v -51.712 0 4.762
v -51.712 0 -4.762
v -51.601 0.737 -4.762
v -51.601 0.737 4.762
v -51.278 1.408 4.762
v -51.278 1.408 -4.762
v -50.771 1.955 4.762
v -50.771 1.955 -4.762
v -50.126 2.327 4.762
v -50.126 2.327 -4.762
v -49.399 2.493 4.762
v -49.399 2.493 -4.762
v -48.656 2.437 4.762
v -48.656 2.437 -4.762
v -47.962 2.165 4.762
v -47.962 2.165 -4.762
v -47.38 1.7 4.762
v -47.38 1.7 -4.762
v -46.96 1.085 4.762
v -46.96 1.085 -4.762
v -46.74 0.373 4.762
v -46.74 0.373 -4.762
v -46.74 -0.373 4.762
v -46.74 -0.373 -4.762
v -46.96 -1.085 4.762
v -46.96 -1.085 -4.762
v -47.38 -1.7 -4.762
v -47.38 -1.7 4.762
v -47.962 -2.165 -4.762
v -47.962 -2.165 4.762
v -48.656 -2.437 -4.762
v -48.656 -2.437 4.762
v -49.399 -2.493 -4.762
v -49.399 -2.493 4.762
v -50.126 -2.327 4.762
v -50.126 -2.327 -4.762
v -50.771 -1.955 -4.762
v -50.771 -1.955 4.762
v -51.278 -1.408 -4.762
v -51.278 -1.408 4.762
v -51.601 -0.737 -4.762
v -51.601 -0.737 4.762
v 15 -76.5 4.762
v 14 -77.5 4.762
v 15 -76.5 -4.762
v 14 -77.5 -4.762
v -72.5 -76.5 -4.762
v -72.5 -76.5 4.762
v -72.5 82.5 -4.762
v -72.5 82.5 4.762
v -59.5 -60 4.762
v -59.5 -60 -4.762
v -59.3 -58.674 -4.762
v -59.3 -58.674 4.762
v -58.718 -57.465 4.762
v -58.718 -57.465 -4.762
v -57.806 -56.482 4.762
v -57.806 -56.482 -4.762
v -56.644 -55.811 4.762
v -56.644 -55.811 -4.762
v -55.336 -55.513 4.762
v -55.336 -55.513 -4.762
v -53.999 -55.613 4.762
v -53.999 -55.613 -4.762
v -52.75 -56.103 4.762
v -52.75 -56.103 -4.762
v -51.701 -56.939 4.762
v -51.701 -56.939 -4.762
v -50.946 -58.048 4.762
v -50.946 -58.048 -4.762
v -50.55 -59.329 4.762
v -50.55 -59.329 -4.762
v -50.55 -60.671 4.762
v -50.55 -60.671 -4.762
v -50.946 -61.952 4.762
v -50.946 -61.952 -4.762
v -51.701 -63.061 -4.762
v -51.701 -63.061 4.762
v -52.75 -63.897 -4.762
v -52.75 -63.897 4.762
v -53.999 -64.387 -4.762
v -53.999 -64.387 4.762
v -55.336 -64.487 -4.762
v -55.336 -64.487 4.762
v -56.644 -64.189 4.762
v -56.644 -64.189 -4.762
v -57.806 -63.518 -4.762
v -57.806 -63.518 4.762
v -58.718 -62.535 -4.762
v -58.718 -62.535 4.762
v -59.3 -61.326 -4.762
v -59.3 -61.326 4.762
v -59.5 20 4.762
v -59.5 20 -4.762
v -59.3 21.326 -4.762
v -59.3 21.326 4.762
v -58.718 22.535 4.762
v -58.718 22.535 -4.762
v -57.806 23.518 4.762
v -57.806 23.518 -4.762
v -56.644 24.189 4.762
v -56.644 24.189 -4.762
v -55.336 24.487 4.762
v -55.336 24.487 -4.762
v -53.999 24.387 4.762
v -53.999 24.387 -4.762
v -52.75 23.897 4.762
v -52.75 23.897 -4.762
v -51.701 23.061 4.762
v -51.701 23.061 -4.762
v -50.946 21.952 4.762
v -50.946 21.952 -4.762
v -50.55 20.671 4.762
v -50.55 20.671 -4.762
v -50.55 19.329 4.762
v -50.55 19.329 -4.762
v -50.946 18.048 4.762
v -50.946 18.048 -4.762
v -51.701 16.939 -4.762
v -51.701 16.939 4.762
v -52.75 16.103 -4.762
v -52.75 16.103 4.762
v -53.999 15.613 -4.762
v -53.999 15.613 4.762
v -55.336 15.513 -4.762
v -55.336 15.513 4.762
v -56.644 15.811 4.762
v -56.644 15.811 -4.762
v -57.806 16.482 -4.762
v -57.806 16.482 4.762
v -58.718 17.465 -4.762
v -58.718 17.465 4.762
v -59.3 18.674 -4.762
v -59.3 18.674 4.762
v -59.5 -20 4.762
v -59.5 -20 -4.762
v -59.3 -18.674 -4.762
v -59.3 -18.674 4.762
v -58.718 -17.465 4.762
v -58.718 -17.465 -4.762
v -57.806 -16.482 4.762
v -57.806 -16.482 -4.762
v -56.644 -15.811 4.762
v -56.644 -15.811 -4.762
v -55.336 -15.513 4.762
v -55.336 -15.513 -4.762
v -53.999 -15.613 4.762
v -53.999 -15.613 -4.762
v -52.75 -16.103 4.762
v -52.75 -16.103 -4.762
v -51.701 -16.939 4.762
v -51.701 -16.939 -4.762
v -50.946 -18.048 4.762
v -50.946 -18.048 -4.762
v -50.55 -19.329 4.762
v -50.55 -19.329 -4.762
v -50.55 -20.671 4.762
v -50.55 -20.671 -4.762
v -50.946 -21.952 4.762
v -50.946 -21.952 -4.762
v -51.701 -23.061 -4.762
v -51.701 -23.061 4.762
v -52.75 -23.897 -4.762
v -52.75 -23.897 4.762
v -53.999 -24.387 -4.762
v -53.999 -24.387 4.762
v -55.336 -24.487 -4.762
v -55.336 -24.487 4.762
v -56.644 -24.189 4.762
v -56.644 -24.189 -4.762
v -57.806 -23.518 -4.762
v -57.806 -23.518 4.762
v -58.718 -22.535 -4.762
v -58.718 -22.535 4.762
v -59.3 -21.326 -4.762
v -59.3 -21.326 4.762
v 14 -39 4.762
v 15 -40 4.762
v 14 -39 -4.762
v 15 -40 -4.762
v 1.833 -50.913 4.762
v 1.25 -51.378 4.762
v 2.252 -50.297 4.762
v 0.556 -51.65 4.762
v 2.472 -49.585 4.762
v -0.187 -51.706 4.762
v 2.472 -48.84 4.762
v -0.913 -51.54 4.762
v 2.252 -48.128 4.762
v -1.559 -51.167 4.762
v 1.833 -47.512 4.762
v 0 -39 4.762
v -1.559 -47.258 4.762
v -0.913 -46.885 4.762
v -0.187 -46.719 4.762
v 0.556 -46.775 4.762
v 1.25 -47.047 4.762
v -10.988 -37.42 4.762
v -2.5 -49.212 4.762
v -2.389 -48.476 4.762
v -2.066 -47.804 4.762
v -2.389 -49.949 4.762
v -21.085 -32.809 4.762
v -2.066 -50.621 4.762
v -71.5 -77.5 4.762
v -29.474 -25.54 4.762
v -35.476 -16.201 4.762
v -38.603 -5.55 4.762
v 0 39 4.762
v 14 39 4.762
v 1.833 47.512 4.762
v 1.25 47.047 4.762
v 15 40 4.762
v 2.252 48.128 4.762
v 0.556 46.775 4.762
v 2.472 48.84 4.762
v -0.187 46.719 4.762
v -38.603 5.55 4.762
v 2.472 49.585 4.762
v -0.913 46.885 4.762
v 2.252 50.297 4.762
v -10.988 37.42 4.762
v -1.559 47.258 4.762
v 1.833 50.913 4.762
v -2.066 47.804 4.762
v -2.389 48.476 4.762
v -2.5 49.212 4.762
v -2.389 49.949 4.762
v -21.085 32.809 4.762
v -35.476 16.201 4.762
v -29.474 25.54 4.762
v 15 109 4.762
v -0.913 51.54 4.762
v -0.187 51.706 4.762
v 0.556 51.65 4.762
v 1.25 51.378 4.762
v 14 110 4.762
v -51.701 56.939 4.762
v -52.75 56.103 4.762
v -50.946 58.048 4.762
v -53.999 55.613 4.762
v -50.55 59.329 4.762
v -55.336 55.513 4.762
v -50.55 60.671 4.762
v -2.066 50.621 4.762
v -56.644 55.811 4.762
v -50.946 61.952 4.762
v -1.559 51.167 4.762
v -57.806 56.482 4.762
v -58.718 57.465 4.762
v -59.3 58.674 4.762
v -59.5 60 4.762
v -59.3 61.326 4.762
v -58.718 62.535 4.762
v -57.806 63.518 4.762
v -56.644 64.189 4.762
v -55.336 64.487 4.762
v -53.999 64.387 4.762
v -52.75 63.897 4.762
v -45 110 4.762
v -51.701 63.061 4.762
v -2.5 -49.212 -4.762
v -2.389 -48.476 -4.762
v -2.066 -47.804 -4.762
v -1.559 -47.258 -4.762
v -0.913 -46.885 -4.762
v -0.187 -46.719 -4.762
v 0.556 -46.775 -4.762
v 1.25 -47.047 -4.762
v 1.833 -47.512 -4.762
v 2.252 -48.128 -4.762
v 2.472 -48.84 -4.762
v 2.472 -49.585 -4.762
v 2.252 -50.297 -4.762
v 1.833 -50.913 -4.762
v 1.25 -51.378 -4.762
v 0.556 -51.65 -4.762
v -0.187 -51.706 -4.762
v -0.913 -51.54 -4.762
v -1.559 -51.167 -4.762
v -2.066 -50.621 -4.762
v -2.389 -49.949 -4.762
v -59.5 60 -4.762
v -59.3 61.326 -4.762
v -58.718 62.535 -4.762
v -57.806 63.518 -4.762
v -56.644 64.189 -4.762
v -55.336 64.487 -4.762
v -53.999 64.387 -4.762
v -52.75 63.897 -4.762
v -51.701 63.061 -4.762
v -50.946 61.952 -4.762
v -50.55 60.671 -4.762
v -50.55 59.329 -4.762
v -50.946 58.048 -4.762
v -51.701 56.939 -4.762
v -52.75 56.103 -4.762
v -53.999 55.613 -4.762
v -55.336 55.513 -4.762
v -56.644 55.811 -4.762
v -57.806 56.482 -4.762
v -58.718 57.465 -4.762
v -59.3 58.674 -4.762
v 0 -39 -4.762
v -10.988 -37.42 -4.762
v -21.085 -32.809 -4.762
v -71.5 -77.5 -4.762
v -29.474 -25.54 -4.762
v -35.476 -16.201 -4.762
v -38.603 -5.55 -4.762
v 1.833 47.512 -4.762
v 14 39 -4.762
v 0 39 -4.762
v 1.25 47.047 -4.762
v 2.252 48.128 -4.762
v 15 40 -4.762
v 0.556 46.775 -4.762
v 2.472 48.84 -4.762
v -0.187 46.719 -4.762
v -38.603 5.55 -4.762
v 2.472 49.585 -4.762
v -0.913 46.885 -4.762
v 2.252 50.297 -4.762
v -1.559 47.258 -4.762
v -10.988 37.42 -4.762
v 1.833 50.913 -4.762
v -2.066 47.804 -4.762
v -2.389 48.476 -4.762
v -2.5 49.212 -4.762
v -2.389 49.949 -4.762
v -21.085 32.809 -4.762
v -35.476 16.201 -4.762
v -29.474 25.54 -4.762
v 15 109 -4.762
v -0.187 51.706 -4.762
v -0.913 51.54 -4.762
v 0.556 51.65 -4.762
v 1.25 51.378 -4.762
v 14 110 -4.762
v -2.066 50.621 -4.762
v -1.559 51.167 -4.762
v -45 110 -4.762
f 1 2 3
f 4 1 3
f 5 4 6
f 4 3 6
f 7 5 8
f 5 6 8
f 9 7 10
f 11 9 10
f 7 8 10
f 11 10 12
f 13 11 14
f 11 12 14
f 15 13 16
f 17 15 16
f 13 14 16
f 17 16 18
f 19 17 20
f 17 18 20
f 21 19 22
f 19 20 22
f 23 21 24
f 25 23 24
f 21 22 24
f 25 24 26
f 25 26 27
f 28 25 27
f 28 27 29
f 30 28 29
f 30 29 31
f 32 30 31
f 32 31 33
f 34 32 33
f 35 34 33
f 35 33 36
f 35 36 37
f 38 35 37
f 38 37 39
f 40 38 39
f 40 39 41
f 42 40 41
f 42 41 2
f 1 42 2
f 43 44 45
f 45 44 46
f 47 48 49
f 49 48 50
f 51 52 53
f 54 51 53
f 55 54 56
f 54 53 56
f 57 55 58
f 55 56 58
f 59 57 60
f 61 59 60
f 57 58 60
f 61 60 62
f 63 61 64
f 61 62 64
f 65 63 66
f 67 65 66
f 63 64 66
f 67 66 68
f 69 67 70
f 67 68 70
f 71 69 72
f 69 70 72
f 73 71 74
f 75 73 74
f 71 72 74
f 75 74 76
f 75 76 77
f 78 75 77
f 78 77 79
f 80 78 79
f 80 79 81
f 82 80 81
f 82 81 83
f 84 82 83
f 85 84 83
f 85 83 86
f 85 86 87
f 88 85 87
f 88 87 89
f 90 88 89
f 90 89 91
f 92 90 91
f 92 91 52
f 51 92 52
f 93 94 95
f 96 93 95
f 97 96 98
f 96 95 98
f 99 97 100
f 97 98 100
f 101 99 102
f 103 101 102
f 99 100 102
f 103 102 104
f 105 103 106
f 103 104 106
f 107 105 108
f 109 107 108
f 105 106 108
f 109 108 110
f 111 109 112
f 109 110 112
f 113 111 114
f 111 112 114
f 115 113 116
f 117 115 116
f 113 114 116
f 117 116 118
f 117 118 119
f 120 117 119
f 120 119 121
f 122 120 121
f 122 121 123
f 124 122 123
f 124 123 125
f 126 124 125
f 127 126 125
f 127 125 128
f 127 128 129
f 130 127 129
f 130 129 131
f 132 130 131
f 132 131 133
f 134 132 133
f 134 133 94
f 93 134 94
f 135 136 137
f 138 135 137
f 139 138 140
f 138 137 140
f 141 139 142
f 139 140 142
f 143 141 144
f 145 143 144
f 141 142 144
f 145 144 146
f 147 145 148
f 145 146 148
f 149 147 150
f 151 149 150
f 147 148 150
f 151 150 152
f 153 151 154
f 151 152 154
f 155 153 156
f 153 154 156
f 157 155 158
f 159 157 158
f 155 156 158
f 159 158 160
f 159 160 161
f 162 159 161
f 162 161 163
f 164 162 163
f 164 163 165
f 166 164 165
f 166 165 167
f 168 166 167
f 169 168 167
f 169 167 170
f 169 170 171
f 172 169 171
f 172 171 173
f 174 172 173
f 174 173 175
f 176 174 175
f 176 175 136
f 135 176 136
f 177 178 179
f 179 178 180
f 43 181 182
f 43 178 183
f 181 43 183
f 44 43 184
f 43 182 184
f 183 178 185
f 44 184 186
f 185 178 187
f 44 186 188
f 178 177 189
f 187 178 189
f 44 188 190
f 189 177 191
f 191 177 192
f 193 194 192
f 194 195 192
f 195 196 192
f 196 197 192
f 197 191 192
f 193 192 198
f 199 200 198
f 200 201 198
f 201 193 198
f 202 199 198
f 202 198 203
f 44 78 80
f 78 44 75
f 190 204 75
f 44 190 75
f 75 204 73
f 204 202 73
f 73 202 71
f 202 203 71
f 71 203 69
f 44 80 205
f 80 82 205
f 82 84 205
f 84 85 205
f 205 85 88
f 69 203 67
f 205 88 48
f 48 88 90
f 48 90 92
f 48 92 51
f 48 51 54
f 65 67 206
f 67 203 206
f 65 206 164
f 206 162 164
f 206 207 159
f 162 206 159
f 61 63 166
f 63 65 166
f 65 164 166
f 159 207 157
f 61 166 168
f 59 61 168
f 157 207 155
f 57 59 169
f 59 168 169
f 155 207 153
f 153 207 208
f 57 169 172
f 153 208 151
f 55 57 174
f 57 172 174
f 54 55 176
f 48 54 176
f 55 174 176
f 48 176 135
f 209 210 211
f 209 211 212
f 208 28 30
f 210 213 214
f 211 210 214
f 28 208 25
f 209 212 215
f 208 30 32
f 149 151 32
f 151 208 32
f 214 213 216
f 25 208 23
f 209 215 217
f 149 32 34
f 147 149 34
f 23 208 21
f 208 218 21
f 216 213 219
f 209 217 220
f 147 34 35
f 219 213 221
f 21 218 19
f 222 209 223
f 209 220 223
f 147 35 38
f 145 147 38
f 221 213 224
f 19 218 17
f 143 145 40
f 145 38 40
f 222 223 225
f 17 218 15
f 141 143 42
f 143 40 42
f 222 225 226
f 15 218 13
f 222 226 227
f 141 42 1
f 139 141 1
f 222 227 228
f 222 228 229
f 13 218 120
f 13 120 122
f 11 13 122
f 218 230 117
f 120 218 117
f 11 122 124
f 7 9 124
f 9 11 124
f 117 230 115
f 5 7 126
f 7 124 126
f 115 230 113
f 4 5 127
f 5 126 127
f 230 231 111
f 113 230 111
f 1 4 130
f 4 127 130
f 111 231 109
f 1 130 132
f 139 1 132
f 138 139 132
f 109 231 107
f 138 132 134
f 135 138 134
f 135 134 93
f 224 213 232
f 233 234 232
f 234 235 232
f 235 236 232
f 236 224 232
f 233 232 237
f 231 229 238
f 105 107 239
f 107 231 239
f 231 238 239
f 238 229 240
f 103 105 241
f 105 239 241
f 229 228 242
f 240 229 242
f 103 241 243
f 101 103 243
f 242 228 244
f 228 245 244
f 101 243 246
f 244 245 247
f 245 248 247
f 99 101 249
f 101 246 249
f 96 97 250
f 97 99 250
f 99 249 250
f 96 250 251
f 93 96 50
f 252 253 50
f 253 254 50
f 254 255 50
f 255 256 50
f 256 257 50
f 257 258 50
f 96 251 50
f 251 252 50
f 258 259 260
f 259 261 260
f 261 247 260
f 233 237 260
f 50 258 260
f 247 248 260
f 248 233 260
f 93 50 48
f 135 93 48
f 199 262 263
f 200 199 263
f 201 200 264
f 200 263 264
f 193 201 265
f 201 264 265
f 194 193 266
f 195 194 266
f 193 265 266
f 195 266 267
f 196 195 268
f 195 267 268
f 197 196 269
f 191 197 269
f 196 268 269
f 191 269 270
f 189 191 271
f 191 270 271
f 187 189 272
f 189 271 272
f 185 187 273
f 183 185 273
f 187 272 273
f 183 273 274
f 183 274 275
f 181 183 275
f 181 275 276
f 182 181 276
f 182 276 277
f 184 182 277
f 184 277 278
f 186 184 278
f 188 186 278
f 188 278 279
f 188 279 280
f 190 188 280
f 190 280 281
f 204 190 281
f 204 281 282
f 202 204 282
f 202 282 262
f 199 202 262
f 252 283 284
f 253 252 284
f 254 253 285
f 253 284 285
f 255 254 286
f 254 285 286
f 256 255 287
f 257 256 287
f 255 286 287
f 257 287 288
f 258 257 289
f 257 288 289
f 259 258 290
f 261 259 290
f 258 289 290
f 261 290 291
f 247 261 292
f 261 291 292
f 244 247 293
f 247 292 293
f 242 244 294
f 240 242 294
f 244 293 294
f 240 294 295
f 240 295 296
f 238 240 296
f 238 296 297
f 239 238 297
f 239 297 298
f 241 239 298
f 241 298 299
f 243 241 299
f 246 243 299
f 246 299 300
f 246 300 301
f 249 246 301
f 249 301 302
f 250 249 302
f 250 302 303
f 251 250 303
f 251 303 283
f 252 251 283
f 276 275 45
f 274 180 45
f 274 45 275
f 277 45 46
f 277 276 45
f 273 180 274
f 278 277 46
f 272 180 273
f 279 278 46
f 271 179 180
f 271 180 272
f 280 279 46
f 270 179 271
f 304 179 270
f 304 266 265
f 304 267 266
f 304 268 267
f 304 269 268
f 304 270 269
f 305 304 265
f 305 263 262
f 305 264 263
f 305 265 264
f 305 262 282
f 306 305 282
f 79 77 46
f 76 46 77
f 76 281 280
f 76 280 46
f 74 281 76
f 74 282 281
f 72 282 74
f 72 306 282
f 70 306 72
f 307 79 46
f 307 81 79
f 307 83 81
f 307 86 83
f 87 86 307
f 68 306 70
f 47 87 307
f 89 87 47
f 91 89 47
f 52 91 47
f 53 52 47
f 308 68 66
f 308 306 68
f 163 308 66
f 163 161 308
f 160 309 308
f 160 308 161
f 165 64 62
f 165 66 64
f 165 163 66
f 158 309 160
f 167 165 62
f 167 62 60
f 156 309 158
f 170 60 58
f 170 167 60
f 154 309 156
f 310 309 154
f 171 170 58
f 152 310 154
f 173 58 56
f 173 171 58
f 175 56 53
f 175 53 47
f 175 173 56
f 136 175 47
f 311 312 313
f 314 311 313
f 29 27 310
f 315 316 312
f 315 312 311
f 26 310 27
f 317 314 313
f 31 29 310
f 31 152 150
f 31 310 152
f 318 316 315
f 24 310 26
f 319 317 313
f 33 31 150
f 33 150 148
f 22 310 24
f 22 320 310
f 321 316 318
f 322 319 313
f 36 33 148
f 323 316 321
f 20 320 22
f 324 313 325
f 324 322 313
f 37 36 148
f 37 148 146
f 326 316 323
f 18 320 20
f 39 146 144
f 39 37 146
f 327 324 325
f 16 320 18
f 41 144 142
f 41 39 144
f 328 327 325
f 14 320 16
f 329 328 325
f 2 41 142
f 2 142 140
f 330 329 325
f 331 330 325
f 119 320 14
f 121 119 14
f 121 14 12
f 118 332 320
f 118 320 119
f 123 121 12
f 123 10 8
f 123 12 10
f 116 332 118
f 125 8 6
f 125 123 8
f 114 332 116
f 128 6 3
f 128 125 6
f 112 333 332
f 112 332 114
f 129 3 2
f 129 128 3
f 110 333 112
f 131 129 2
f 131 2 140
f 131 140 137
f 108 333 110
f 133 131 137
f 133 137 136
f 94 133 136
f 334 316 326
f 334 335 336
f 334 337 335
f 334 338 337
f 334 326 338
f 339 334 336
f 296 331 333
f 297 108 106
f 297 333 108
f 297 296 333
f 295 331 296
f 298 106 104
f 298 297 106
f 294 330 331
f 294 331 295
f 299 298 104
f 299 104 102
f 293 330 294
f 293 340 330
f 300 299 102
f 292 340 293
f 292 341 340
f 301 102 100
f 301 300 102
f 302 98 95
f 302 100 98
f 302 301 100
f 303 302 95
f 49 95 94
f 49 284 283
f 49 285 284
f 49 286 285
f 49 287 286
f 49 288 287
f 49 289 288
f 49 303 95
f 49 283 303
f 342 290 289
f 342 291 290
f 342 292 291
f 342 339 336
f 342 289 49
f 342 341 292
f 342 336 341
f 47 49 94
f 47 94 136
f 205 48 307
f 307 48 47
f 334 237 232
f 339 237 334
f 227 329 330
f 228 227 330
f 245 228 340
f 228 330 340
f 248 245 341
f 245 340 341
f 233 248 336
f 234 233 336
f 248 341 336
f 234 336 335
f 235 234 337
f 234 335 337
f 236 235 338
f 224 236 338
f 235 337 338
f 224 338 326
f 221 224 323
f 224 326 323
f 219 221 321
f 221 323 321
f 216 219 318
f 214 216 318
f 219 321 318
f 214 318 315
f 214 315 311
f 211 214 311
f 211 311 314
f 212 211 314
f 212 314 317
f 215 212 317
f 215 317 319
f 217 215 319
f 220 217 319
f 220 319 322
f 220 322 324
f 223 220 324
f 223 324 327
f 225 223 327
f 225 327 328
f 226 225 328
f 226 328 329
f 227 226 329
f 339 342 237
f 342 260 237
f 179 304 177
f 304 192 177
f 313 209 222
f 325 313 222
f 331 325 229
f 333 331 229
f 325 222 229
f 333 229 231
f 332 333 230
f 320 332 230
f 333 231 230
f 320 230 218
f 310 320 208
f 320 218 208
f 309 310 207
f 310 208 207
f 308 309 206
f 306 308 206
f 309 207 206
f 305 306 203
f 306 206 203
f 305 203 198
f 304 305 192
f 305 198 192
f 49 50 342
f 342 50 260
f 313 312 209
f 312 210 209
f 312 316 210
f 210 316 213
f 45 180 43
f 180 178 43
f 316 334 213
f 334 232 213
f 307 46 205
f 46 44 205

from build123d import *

# Parameters (mm, degrees)
BOSS_EXTRUDE1_DEPTH   = 4.7625
M8_CLEARANCE_HOLE1_D  = 9
M6X1_0_TAPPED_HOLE1_D = 5
CHAMFER1_SIZE         = 1


with BuildPart() as part:
    # Sketch1 → Boss-Extrude1 (new, symmetric)
    with BuildSketch(Plane.XY):
        with BuildLine():
            Line((0, -39), (15, -39))
            Line((15, -39), (15, -77.5))
            Line((15, -77.5), (-72.5, -77.5))
            Line((-72.5, -77.5), (-72.5, 82.5))
            Line((-72.5, 82.5), (-45, 110))
            Line((-45, 110), (15, 110))
            Line((15, 110), (15, 39))
            Line((15, 39), (0, 39))
            ThreePointArc((0, 39), (-39, 0), (0, -39))
        make_face()
    extrude(amount=BOSS_EXTRUDE1_DEPTH, both=True)

    # M8 Clearance Hole1 (through all)
    with Locations(Plane.XY.offset(4.7625)):
        with Locations((-55, 60), (-55, 20), (-55, -20), (-55, -60)):
            Hole(M8_CLEARANCE_HOLE1_D / 2)

    # M6x1.0 Tapped Hole1 (through all)
    with Locations(Plane.XY.offset(4.7625)):
        with Locations((0, 49.2125), (-49.2125, 0), (0, -49.2125)):
            Hole(M6X1_0_TAPPED_HOLE1_D / 2)

    # Chamfer1
    chamfer1_edges = [part.edges().sort_by_distance(p)[0] for p in [
        (15, -39, 0),
        (15, -77.5, 0),
        (-72.5, -77.5, 0),
        (15, 110, 0),
        (15, 39, 0),
    ]]
    chamfer(chamfer1_edges, length=CHAMFER1_SIZE)


solid = part.part
